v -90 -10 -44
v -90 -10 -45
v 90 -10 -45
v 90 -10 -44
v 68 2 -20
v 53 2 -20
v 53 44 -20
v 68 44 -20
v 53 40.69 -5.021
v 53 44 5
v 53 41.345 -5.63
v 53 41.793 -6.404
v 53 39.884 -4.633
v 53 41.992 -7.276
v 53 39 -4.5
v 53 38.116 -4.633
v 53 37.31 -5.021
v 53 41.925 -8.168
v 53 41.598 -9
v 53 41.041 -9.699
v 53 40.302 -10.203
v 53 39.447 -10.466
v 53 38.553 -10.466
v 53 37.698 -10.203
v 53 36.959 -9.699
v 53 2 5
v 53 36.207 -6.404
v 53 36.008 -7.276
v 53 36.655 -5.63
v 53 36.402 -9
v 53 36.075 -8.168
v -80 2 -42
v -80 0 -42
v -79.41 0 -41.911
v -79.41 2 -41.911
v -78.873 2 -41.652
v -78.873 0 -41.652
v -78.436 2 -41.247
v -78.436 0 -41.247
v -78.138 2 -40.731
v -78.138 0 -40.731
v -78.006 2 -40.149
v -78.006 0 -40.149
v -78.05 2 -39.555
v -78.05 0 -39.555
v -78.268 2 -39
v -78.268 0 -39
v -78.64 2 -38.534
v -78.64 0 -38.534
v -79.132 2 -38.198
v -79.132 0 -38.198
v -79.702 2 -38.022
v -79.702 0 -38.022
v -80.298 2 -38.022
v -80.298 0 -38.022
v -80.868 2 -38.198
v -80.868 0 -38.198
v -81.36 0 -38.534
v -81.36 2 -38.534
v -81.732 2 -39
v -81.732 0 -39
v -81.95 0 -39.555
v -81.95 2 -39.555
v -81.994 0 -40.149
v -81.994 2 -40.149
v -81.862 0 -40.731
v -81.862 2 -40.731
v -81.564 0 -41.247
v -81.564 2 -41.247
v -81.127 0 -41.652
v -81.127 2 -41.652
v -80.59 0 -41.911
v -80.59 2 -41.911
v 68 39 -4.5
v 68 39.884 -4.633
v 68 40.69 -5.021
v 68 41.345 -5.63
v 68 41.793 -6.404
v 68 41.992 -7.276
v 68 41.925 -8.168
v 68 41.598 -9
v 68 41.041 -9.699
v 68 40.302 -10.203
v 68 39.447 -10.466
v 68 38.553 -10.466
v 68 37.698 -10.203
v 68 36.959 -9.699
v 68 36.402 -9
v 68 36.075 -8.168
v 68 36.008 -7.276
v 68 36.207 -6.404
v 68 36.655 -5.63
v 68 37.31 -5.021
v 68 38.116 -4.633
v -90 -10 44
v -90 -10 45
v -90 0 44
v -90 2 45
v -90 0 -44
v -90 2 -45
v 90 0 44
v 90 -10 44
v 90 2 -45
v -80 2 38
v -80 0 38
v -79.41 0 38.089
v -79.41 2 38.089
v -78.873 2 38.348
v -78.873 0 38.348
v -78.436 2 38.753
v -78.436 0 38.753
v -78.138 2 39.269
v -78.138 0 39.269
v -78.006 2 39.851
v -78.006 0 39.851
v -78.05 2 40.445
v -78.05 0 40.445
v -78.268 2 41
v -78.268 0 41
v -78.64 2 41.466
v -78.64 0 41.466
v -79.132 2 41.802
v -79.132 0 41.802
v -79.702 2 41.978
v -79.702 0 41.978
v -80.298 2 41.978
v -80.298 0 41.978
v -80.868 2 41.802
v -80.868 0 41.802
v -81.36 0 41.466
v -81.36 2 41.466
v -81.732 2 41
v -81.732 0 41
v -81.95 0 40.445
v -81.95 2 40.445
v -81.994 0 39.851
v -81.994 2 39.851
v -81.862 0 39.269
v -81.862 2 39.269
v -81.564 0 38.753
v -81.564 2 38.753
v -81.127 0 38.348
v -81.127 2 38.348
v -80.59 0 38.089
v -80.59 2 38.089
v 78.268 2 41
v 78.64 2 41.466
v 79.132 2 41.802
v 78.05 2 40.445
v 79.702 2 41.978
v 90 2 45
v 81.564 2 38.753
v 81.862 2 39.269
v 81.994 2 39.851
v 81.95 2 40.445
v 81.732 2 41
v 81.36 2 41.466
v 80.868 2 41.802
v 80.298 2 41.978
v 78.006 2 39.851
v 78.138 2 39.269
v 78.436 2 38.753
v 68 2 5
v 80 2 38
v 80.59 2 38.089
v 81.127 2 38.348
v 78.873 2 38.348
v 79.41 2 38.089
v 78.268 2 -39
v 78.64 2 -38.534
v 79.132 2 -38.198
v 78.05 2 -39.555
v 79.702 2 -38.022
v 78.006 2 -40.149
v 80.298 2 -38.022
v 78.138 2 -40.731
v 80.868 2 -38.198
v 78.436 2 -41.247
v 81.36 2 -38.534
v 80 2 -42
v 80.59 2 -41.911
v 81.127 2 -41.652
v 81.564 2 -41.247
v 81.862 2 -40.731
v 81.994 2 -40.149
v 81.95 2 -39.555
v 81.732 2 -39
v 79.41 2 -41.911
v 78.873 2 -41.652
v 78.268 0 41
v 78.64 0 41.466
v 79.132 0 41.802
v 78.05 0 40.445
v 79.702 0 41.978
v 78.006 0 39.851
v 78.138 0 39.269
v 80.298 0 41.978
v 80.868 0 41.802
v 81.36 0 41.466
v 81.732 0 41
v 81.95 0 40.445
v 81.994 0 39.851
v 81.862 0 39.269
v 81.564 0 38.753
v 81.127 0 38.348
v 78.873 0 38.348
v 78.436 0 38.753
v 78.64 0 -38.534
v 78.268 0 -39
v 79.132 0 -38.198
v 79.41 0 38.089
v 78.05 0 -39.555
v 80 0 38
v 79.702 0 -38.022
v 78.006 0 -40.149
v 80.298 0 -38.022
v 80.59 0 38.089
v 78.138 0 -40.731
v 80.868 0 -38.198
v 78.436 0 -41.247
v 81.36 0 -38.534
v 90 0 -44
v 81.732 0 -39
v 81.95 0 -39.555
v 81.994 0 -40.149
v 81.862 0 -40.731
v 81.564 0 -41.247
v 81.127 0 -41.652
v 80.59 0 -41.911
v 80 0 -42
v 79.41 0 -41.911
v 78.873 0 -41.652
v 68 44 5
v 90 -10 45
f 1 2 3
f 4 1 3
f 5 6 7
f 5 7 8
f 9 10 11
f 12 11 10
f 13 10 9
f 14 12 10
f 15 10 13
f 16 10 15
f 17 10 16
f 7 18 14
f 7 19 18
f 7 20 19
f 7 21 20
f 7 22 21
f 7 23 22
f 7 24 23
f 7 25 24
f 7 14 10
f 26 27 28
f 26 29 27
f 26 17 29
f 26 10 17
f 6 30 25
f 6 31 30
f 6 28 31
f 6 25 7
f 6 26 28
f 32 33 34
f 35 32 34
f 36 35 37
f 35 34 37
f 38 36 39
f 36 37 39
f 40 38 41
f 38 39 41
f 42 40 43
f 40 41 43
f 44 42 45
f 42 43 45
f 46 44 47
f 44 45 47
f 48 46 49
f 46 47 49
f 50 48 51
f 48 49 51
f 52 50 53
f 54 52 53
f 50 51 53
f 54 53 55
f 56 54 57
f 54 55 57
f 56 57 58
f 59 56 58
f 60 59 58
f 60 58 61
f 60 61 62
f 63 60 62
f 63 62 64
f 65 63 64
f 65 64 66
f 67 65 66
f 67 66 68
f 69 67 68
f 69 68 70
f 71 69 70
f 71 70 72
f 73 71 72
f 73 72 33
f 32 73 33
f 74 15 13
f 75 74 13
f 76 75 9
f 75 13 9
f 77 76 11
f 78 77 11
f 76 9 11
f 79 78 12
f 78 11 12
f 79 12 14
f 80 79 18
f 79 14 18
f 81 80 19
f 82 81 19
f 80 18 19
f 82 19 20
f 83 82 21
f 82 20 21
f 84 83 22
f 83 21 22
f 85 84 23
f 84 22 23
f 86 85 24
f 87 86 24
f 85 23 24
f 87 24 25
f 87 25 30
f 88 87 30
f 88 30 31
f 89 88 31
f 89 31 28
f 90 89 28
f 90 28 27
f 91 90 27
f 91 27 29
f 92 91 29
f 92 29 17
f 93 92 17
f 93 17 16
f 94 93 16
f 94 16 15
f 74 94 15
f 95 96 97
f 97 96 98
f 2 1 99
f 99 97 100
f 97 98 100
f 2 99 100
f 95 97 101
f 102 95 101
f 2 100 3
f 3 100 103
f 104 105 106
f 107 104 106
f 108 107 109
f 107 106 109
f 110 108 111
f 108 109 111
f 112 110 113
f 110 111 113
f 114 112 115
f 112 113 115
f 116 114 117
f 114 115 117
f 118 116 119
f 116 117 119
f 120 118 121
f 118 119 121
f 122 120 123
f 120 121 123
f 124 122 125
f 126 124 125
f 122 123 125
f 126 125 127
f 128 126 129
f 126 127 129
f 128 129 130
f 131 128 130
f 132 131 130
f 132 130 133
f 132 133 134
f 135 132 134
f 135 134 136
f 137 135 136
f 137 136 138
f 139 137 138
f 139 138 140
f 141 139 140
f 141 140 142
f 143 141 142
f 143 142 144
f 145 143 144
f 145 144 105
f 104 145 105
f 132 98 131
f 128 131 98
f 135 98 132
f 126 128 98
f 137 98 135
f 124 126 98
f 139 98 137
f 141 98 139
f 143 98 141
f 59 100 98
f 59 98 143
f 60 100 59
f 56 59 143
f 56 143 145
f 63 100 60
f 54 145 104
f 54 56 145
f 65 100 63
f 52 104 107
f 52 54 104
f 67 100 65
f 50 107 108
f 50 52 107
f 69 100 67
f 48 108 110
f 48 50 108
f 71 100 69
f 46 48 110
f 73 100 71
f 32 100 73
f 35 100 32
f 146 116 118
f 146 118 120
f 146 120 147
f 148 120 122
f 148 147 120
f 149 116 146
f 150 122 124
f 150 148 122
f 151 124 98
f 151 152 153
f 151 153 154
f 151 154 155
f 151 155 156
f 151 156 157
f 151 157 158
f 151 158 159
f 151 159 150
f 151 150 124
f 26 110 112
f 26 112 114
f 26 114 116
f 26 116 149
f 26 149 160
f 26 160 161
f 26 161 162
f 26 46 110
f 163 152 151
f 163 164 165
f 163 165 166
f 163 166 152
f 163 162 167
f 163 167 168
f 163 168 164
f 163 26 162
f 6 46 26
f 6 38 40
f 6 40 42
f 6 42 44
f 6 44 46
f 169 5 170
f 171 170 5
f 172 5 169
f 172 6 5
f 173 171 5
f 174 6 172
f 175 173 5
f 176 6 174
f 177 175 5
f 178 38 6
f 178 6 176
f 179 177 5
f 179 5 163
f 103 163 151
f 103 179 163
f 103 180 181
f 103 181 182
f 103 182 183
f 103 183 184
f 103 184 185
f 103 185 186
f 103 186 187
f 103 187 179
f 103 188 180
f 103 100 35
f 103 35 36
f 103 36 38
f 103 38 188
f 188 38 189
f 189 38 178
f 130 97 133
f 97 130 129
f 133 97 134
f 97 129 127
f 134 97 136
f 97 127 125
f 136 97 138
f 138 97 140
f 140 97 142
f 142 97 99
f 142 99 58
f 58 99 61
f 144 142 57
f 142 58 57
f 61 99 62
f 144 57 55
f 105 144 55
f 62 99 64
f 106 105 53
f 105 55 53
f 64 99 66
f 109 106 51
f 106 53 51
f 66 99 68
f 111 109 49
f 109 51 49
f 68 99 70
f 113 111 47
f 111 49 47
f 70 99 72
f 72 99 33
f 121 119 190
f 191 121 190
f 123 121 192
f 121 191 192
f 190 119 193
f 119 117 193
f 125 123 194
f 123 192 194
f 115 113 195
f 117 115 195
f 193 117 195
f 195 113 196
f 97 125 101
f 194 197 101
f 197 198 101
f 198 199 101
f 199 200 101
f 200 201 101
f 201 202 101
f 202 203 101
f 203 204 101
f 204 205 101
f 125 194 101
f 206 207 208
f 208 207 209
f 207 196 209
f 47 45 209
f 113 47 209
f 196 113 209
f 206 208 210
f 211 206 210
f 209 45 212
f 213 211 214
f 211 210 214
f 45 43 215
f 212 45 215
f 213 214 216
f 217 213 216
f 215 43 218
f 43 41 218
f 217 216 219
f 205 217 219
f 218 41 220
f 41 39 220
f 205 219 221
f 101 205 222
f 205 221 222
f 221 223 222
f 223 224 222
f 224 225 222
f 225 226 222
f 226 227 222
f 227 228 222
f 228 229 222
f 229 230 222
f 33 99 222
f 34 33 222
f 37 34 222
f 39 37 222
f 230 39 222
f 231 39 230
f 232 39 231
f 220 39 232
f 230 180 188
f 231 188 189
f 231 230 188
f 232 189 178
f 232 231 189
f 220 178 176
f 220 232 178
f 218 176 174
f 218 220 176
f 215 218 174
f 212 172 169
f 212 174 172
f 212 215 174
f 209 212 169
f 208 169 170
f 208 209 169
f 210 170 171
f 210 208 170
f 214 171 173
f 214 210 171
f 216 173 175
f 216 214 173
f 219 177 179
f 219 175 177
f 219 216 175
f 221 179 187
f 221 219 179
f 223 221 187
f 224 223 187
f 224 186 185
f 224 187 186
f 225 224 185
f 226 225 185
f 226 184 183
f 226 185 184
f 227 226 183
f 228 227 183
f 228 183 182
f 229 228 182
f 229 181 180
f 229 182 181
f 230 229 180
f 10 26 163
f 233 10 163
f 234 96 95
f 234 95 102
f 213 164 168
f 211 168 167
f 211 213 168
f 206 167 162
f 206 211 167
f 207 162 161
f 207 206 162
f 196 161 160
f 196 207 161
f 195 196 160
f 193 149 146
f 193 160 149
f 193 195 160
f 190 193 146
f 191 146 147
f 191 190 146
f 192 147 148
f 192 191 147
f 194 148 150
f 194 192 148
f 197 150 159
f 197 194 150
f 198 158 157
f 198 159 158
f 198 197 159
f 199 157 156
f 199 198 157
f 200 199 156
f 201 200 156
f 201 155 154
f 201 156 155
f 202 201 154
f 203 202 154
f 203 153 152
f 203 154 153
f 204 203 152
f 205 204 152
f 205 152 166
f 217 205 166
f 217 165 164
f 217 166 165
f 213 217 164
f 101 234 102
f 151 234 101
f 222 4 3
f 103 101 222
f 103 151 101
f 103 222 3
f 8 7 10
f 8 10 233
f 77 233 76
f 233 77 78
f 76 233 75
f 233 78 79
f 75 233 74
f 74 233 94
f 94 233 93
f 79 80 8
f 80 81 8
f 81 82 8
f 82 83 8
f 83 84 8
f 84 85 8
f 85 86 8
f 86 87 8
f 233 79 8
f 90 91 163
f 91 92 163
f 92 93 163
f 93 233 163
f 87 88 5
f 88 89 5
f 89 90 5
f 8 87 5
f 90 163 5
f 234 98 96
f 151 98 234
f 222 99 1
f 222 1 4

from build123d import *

# Parameters (mm, degrees)
IZIM1_W                     = 180
IZIM1_H                     = 90
Y_KSEKLIK_EKSTR_ZYON1_DEPTH = 2
IZIM2_W                     = 180
IZIM2_H                     = 1
Y_KSEKLIK_EKSTR_ZYON2_DEPTH = 10
IZIM3_R                     = 2
KES_EKSTR_ZYON1_DEPTH       = 10
IZIM6_W                     = 15
IZIM6_H                     = 25
Y_KSEKLIK_EKSTR_ZYON3_DEPTH = 42
IZIM7_R                     = 3
KES_EKSTR_ZYON2_DEPTH       = 49


with BuildPart() as part:
    # Çizim1 → Yükseklik-Ekstrüzyon1 (new body)
    with BuildSketch(Plane(origin=(0, 0, 0), x_dir=(1, 0, 0), z_dir=(0, 1, 0))):
        Rectangle(IZIM1_W, IZIM1_H)
    extrude(amount=Y_KSEKLIK_EKSTR_ZYON1_DEPTH)

    # Çizim2 → Yükseklik-Ekstrüzyon2 (add)
    with BuildSketch(Plane.XZ):
        with Locations((0, 44.5)):
            Rectangle(IZIM2_W, IZIM2_H)
    y_kseklik_ekstr_zyon2 = extrude(amount=Y_KSEKLIK_EKSTR_ZYON2_DEPTH)

    # Aynalama1: Yükseklik-Ekstrüzyon2 across plane
    add(y_kseklik_ekstr_zyon2.mirror(Plane.XY))

    # Çizim3 → Kes-Ekstrüzyon1 (cut)
    with BuildSketch(Plane.XZ):
        with Locations(Location((-80, 40, 0), (0, 0, 270))):
            Circle(IZIM3_R)
        with Locations(Location((-80, -40, 0), (0, 0, 270))):
            Circle(IZIM3_R)
    kes_ekstr_zyon1 = extrude(amount=-KES_EKSTR_ZYON1_DEPTH, mode=Mode.SUBTRACT)

    # Aynalama2: Kes-Ekstrüzyon1 across plane
    add(kes_ekstr_zyon1.mirror(Plane(origin=(0, 0, 0), x_dir=(0, 0, 1), z_dir=(1, 0, 0))), mode=Mode.SUBTRACT)

    # Çizim6 → Yükseklik-Ekstrüzyon3 (add)
    with BuildSketch(Plane(origin=(0, 2, 0), x_dir=(1, 0, 0), z_dir=(0, 1, 0))):
        with Locations((60.5, 7.5)):
            Rectangle(IZIM6_W, IZIM6_H)
    extrude(amount=Y_KSEKLIK_EKSTR_ZYON3_DEPTH)

    # Çizim7 → Kes-Ekstrüzyon2 (cut)
    with BuildSketch(Plane.ZY.offset(-53)):
        with Locations((-7.5, 39)):
            Circle(IZIM7_R)
    extrude(amount=-KES_EKSTR_ZYON2_DEPTH, mode=Mode.SUBTRACT)


solid = part.part
